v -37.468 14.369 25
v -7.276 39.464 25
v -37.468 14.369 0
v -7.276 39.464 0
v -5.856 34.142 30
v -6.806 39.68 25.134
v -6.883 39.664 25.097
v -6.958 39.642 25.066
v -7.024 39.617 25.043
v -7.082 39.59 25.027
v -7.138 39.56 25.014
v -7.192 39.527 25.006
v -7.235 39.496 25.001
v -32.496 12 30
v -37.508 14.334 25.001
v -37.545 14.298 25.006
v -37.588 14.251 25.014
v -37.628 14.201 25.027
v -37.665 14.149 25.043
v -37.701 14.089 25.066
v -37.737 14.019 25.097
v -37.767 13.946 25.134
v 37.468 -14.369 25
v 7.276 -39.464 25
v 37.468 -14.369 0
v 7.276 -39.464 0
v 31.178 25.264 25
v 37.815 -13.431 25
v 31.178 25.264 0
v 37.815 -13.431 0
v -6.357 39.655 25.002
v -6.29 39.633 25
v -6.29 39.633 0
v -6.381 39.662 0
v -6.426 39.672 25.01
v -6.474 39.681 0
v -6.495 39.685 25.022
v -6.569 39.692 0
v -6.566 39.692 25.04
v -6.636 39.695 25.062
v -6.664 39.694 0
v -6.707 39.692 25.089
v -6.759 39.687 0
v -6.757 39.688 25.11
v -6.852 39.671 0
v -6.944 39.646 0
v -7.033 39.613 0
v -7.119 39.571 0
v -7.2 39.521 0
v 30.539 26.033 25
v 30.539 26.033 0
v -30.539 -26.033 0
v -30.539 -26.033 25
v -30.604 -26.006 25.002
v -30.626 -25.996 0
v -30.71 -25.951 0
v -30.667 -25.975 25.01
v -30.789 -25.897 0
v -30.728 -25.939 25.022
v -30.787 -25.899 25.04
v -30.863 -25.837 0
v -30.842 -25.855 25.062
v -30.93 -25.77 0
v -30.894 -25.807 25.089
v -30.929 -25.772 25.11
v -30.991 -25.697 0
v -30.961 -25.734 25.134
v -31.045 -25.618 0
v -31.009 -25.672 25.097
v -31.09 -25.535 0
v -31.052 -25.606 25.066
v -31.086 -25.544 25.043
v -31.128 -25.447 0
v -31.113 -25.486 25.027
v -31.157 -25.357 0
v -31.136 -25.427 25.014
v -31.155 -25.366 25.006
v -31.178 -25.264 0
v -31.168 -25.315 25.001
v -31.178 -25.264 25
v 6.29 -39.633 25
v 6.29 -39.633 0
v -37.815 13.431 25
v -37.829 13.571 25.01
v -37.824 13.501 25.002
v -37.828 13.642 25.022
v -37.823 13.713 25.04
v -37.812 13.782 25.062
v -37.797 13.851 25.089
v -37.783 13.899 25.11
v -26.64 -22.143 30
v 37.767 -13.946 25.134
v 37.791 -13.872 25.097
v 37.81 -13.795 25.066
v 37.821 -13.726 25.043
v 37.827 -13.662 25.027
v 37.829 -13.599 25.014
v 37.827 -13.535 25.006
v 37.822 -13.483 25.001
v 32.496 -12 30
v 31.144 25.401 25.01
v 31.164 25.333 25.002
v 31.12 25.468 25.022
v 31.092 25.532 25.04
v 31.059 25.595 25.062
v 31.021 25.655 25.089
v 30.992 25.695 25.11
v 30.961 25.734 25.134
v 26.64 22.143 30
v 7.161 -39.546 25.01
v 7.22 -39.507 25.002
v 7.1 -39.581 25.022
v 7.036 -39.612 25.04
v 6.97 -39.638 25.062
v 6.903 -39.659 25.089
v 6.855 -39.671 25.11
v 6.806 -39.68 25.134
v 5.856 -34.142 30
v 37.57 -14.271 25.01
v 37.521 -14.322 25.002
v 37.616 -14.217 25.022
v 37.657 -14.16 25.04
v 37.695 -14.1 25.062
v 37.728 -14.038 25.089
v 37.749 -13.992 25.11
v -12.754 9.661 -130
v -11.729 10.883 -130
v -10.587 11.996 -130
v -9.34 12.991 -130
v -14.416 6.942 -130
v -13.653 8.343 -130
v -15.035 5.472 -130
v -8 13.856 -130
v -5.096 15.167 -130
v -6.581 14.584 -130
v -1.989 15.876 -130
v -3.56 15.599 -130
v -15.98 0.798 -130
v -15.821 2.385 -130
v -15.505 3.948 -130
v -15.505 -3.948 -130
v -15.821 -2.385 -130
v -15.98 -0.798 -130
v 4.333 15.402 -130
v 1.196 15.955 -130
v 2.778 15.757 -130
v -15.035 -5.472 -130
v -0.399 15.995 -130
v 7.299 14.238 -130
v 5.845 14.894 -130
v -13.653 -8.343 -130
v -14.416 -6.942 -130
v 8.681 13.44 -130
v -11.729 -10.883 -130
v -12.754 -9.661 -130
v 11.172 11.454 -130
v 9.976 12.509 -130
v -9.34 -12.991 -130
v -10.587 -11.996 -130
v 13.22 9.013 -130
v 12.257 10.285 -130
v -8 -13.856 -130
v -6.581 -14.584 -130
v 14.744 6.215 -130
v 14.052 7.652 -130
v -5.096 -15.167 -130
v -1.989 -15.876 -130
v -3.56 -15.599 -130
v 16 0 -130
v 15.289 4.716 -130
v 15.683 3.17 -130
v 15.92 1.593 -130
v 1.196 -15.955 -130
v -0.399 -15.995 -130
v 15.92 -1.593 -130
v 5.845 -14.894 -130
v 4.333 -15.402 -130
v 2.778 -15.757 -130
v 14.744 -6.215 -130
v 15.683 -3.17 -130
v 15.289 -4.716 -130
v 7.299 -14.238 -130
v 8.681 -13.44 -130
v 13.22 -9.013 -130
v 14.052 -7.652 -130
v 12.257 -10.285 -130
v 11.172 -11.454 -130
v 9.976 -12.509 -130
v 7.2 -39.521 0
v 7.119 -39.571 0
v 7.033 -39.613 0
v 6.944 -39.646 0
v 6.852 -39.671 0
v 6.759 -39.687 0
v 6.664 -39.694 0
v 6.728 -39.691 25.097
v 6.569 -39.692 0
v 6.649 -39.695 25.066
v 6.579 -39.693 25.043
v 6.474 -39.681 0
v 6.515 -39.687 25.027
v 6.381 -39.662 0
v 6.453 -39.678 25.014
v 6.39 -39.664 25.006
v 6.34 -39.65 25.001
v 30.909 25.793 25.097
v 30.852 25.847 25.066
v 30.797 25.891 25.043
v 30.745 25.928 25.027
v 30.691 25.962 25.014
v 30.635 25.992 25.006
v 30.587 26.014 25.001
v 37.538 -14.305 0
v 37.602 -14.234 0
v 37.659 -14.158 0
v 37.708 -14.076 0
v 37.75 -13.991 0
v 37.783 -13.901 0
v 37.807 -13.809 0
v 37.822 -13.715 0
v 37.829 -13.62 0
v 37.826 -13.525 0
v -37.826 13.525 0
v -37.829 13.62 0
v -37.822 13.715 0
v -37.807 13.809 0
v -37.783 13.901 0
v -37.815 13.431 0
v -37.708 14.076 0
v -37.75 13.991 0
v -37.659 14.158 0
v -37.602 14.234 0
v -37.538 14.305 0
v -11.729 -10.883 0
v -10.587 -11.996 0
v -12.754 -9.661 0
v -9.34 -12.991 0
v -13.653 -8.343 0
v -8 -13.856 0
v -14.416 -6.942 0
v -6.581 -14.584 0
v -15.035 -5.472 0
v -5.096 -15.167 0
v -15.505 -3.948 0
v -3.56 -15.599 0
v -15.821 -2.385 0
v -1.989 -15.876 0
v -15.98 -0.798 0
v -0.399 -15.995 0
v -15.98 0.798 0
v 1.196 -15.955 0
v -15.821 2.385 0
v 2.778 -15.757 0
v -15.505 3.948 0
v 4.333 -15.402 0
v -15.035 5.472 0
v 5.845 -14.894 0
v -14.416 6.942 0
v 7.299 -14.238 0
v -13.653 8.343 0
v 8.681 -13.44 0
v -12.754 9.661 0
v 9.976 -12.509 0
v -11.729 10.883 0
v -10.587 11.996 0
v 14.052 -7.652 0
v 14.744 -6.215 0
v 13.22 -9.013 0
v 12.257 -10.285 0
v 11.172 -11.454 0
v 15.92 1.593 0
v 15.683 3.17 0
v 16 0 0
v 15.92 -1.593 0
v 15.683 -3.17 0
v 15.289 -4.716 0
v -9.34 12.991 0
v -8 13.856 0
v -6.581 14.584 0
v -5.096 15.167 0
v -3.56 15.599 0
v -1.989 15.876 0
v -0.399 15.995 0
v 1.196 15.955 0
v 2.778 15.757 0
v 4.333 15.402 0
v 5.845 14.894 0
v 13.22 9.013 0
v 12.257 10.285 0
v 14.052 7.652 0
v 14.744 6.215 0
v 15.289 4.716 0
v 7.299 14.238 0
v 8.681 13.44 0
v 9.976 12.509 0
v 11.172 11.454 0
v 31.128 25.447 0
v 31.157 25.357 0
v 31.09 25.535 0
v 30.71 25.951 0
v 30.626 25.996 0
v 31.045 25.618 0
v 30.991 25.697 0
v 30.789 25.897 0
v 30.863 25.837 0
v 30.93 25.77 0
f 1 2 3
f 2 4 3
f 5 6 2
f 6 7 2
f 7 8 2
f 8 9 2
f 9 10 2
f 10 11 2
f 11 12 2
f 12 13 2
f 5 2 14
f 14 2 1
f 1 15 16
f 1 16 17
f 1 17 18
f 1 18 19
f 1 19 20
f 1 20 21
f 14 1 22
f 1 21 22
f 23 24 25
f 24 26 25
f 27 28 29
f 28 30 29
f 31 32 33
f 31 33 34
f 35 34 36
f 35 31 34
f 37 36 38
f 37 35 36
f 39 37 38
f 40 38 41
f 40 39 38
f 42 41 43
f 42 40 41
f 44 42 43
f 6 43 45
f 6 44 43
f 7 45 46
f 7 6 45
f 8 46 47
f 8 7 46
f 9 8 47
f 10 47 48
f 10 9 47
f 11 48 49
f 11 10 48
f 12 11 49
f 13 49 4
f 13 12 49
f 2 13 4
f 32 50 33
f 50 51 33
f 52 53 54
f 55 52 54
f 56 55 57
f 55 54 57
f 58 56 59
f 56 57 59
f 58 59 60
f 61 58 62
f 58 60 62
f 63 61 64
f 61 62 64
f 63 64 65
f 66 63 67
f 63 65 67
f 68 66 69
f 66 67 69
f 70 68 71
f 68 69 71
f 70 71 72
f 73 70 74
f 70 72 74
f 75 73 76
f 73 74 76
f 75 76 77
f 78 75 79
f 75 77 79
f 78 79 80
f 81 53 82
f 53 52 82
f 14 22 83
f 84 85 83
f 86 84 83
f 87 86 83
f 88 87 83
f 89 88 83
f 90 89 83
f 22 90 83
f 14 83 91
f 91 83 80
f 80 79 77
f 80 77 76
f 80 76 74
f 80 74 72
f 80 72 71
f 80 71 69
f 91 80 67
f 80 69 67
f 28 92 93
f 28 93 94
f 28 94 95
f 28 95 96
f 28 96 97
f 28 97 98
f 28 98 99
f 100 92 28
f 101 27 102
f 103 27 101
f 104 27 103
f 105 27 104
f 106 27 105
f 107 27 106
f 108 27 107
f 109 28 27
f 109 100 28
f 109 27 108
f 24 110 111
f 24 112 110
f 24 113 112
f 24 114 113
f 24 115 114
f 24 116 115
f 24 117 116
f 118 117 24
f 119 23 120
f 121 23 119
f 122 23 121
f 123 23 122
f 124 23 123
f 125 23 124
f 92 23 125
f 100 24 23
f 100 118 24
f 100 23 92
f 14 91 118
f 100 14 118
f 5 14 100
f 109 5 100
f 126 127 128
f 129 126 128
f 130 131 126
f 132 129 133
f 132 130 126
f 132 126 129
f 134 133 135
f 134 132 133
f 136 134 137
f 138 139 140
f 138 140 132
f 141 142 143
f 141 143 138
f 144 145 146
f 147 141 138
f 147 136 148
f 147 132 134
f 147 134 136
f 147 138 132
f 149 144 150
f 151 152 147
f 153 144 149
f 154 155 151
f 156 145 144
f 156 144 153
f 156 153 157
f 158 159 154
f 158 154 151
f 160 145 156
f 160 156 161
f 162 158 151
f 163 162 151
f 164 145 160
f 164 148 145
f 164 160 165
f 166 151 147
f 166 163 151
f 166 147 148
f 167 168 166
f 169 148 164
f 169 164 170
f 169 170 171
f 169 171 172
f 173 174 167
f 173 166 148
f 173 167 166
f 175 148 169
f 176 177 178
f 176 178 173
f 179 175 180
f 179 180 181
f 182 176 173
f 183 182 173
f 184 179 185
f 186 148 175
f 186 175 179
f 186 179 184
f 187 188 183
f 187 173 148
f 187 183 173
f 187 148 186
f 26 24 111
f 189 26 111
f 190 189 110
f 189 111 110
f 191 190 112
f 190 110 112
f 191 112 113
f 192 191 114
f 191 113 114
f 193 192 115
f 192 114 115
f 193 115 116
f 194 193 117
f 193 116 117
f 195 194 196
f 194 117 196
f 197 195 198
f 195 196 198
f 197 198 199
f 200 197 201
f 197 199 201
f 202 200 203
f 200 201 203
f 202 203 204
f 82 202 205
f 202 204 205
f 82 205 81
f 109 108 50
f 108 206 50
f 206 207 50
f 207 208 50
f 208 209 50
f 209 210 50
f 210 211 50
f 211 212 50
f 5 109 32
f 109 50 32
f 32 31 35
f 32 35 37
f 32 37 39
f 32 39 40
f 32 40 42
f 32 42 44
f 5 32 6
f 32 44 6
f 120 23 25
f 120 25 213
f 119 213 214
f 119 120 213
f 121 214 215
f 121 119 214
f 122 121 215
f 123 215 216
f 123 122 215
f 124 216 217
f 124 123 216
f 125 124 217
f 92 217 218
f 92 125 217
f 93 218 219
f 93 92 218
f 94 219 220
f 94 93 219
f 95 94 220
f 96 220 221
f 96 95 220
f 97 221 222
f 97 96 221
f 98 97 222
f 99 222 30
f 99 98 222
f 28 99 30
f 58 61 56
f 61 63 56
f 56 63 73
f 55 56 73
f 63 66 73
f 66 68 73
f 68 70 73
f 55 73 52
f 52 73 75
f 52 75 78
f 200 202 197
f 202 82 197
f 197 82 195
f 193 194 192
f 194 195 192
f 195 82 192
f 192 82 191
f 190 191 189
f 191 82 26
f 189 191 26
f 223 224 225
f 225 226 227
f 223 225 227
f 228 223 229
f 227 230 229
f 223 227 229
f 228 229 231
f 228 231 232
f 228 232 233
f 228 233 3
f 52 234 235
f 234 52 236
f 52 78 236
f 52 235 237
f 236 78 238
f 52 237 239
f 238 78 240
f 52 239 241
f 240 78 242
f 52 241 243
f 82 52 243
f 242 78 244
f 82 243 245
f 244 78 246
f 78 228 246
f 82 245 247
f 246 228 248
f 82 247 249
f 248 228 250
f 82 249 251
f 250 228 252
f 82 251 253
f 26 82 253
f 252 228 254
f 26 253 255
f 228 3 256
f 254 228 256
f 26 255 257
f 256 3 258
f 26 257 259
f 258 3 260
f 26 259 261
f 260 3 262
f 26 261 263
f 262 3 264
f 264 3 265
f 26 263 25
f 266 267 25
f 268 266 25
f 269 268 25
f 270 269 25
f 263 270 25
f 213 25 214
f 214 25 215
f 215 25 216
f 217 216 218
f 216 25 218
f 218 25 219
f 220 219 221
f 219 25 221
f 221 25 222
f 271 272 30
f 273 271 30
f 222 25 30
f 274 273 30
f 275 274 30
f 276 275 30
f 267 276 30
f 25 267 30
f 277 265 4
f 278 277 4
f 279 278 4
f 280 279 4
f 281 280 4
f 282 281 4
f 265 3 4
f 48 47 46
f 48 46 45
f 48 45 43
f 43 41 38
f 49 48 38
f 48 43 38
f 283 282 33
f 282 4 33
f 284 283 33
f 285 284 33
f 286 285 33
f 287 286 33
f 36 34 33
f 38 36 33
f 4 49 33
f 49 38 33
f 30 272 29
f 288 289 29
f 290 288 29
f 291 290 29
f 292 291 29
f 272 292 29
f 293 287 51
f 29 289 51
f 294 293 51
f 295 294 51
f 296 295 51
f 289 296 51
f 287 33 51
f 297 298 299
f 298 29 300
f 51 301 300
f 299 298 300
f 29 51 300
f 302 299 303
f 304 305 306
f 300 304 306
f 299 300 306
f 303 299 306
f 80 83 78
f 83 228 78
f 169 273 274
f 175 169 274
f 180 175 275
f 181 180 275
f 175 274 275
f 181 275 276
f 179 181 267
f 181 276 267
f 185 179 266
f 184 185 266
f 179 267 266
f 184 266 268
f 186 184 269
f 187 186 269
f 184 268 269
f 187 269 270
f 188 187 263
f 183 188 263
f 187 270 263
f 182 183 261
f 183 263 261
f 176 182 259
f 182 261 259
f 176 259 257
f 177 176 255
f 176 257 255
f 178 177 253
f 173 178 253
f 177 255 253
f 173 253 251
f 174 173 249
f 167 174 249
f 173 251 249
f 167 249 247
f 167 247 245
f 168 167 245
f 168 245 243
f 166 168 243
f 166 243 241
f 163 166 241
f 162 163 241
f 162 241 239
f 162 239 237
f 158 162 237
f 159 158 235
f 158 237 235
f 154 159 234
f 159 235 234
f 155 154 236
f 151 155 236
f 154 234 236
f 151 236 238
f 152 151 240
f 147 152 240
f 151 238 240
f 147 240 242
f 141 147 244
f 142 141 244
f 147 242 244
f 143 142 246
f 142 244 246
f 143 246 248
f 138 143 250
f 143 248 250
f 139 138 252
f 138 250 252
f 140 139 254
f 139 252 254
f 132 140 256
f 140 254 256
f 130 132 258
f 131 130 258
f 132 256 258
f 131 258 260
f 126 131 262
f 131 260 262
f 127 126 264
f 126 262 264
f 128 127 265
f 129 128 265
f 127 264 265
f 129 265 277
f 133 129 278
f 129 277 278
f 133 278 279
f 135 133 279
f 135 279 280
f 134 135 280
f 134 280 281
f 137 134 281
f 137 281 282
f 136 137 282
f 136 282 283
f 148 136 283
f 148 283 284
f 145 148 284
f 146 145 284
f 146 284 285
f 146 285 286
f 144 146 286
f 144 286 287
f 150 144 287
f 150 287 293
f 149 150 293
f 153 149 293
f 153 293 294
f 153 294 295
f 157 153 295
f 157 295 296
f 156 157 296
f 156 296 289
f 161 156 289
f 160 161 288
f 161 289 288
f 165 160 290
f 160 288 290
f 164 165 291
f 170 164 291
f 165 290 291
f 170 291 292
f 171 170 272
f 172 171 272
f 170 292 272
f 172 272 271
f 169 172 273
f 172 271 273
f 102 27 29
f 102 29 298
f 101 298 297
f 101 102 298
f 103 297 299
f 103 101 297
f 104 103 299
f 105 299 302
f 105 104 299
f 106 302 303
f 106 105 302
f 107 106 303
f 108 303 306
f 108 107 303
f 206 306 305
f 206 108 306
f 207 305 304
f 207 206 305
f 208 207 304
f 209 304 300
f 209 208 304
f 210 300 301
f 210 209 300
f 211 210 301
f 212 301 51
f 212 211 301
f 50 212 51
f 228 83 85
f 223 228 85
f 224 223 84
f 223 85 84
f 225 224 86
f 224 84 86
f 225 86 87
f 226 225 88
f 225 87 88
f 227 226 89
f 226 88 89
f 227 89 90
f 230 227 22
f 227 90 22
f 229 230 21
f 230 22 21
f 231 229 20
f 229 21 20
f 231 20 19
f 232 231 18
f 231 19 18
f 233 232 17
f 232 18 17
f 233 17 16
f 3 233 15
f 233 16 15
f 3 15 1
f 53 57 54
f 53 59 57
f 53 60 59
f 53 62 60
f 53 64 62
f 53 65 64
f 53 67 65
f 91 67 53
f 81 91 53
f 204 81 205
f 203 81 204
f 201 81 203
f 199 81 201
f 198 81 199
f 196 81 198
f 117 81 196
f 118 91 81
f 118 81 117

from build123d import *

# Parameters (mm, degrees)
F1_DEPTH = 30
F2_R     = 16
F3_DEPTH = 130
F4_SIZE  = 5
F5_R     = 1


with BuildPart() as f1:
    # F0 (on Top) → F1 (new body)
    with BuildSketch(Plane.XY):
        Polygon((6.831874, -39.832886), (37.912228, -13.999867), (31.080354, 25.83302), (-6.831874, 39.832886), (-37.912228, 13.999867), (-31.080354, -25.83302), align=None)
    extrude(amount=F1_DEPTH)

    # F2 (on face) → F3 (join)
    with BuildSketch(Plane(origin=(0, 0, 0), x_dir=(1, 0, 0), z_dir=(0, 0, -1))):
        Circle(F2_R)
    extrude(amount=F3_DEPTH)

    # F4
    f4_edges = [f1.edges().sort_by_distance(p)[0] for p in [
        (22.372051, -26.916377, 30),
        (-12.12424, -32.832953, 30),
        (-34.496291, -5.916576, 30),
        (-22.372051, 26.916377, 30),
        (12.12424, 32.832953, 30),
        (34.496291, 5.916576, 30),
    ]]
    chamfer(f4_edges, length=F4_SIZE)

    # F5
    f5_edges = [f1.edges().sort_by_distance(p)[0] for p in [
        (6.831874, -39.832886, 12.5),
        (37.912228, -13.999867, 12.5),
        (31.080354, 25.83302, 12.5),
        (-6.831874, 39.832886, 12.5),
        (-37.912228, 13.999867, 12.5),
        (-31.080354, -25.83302, 12.5),
    ]]
    fillet(f5_edges, radius=F5_R)


solid = f1.part
